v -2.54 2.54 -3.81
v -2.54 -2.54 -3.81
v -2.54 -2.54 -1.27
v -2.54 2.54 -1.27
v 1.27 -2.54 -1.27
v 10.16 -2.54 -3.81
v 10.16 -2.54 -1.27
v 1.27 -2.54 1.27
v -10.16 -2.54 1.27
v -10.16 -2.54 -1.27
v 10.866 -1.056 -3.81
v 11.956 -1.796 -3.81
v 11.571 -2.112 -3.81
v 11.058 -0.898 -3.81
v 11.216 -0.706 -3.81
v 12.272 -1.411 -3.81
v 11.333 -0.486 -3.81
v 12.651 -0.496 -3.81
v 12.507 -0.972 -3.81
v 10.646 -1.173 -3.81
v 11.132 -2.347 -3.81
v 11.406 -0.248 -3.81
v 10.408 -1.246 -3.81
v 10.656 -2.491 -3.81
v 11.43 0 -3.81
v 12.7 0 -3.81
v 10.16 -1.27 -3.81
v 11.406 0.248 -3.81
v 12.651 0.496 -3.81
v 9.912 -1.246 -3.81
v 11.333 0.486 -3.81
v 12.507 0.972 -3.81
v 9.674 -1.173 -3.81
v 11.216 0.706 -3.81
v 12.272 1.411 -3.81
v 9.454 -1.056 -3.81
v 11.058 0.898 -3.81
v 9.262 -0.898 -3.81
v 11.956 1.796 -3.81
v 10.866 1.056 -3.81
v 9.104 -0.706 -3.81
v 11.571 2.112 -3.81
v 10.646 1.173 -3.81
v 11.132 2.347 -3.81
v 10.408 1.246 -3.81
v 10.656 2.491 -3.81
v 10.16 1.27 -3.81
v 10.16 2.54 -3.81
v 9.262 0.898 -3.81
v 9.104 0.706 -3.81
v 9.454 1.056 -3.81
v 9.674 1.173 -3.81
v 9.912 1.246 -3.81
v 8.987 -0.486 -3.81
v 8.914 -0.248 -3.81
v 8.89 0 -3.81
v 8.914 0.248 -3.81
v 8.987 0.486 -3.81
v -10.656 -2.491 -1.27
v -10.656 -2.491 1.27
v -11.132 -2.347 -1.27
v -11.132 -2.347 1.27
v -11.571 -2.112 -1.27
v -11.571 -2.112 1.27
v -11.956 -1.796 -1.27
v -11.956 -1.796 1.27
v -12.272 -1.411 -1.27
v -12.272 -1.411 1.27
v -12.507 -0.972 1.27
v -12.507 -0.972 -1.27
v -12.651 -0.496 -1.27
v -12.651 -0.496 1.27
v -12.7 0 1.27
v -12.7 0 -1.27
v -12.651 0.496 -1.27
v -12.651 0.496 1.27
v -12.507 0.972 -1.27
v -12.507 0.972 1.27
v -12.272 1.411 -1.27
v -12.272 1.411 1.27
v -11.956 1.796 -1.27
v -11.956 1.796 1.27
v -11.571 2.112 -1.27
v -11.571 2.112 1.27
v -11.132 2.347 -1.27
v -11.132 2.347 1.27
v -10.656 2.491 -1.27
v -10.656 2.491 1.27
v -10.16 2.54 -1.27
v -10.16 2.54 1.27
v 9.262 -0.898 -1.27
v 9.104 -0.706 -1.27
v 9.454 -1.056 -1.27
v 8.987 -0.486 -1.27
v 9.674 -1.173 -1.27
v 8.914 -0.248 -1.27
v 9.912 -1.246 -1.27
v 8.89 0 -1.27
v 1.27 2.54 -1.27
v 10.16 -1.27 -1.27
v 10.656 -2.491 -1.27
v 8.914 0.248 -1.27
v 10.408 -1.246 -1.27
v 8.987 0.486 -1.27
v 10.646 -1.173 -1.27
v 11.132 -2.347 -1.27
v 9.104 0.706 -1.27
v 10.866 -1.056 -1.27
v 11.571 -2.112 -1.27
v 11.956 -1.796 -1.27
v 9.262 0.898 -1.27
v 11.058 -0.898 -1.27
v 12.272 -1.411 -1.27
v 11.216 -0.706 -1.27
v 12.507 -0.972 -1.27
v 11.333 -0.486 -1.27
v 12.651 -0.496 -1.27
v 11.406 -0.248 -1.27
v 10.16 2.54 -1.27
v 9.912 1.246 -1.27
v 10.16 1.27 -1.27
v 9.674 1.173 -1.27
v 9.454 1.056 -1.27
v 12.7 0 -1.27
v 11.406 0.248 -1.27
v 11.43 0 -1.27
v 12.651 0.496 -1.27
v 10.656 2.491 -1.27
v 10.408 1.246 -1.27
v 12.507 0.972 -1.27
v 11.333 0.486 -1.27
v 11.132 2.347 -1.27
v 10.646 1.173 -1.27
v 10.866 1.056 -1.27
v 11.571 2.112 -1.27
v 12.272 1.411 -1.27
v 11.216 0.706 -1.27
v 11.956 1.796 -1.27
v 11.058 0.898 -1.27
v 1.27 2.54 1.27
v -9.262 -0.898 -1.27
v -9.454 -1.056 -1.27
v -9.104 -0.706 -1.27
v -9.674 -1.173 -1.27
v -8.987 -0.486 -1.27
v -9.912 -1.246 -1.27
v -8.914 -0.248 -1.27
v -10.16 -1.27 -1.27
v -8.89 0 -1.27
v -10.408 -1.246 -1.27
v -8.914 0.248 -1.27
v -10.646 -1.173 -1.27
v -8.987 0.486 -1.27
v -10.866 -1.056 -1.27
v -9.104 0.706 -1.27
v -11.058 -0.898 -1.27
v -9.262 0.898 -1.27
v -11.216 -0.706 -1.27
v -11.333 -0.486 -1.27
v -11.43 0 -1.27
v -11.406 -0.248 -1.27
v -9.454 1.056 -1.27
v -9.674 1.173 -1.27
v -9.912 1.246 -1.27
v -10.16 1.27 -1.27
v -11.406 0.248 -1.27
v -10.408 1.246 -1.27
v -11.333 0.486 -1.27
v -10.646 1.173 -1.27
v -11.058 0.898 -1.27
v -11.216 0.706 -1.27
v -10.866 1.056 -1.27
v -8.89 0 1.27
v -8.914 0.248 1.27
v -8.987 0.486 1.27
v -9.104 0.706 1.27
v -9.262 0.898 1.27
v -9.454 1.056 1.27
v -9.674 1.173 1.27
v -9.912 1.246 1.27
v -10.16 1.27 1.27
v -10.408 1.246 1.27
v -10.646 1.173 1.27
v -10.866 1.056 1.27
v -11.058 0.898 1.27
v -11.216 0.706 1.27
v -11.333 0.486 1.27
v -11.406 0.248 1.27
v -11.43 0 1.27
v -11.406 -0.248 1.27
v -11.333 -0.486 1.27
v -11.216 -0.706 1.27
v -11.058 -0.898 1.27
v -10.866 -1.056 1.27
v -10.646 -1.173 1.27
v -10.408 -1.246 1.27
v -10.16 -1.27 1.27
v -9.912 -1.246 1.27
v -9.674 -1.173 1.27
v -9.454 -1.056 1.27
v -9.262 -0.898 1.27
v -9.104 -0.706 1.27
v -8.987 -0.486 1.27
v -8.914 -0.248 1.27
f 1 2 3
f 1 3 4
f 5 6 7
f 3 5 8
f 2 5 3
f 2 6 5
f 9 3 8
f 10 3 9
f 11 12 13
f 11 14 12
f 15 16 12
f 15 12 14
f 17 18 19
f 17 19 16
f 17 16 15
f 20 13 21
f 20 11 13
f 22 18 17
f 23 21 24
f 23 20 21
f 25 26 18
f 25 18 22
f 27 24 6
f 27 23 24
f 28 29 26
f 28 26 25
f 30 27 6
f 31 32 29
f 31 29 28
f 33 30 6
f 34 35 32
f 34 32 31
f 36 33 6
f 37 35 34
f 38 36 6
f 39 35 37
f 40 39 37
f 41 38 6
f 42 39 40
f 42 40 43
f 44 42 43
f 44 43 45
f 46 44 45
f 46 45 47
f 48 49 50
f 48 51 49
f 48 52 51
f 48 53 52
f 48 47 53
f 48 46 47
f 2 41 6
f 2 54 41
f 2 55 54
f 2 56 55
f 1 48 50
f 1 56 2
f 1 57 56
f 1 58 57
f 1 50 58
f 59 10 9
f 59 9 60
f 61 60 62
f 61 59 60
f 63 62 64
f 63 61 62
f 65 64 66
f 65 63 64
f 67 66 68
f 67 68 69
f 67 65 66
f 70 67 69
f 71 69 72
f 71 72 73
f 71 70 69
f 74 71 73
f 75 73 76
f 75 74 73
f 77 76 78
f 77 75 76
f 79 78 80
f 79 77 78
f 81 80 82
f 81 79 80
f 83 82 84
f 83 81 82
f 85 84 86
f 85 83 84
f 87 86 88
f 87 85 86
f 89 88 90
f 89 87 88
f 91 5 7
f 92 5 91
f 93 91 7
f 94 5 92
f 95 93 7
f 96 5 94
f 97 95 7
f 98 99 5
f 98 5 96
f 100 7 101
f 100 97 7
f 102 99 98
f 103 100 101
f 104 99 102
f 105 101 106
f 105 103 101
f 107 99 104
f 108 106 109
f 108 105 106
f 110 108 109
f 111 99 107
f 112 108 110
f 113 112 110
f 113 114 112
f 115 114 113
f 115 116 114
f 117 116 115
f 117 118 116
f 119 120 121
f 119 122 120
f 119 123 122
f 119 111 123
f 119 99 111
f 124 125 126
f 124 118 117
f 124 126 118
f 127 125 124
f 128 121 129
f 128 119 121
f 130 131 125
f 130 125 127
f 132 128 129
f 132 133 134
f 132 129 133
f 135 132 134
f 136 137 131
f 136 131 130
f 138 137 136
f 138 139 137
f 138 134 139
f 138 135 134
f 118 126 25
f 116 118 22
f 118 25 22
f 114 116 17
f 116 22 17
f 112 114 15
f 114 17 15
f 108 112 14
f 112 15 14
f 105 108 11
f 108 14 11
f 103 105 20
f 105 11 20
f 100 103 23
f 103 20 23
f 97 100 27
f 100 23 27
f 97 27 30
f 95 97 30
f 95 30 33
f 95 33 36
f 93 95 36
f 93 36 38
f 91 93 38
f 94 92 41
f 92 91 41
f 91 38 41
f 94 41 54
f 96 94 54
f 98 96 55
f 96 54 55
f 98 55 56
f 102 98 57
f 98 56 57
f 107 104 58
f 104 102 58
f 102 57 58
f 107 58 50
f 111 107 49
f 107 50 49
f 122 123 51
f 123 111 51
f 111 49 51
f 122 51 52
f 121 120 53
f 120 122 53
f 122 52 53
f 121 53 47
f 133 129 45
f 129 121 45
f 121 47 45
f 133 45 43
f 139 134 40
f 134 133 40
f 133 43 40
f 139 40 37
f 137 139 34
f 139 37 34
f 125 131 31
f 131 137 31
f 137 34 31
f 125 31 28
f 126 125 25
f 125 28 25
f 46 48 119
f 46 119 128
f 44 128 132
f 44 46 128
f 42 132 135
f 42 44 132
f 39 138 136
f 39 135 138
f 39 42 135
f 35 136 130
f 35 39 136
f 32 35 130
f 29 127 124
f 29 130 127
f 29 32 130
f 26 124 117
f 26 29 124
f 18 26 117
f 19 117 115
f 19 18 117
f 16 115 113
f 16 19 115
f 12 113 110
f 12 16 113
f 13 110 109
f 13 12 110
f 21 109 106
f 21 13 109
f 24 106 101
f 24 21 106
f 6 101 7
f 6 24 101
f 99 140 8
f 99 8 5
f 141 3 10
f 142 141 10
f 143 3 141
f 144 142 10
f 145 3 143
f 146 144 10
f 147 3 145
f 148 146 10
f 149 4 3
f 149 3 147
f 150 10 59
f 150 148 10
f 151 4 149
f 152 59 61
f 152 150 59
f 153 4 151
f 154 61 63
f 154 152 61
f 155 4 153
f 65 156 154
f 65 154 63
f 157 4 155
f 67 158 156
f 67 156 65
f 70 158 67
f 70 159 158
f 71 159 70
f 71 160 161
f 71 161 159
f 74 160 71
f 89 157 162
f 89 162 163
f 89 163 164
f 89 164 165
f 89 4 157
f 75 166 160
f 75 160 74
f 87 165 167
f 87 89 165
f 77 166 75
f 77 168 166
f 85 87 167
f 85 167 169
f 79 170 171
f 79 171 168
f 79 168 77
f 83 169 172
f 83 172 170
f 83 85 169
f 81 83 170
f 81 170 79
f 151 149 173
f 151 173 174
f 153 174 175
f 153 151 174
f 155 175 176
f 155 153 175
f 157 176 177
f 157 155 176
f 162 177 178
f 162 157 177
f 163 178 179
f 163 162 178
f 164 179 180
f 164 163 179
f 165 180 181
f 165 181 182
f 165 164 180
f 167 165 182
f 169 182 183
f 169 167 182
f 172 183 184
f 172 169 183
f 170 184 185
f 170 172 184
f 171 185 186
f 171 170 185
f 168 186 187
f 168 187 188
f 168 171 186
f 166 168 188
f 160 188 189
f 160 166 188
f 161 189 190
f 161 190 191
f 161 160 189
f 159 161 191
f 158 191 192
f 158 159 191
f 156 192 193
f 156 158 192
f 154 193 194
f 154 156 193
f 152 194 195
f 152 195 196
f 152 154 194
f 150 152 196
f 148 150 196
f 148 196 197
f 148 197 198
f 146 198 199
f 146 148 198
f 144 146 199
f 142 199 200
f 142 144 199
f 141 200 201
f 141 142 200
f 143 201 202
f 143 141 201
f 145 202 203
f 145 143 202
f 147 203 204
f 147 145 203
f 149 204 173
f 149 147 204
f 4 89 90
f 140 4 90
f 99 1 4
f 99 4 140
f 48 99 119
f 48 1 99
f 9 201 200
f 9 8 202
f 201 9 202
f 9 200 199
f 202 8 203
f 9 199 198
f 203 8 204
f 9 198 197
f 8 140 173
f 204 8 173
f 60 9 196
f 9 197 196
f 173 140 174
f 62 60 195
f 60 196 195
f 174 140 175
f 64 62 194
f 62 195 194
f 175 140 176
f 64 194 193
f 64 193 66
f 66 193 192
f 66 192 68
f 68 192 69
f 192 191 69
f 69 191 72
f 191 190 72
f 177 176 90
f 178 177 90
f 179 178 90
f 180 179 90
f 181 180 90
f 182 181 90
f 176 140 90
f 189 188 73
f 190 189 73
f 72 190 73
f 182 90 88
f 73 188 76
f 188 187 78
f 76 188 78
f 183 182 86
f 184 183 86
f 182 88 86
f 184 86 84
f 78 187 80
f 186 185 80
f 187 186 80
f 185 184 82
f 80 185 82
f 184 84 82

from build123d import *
from build123d.topology import SkipClean

# Parameters (mm, degrees)
BOSS_EXTRUDE1_DEPTH      = 1.27
BOSS_EXTRUDE1_DEPTH_BACK = 1.27
SKETCH1_R                = 1.27
BOSS_EXTRUDE2_START      = 2.54
SKETCH3_R                = 1.27
BOSS_EXTRUDE2_DEPTH      = 2.54
SKETCH4_W                = 11.43
SKETCH4_H                = 2.54
CUT_EXTRUDE2_DEPTH       = 15.199031657


with BuildPart() as part:
    # Sketch1 → Boss-Extrude1 (new, two sides: drawn at the far end of the back side and taken through both)
    with BuildSketch(Plane.XY.offset(-BOSS_EXTRUDE1_DEPTH_BACK)):
        with BuildLine():
            Line((-10.16, 2.54), (10.16, 2.54))
            ThreePointArc((10.16, 2.54), (12.7, 0), (10.16, -2.54))
            Line((10.16, -2.54), (-10.16, -2.54))
            ThreePointArc((-10.16, -2.54), (-12.7, 0), (-10.16, 2.54))
        make_face()
        with Locations((-10.16, 0)):
            Circle(SKETCH1_R, mode=Mode.SUBTRACT)
        with Locations((10.16, 0)):
            Circle(SKETCH1_R, mode=Mode.SUBTRACT)
    extrude(amount=BOSS_EXTRUDE1_DEPTH + BOSS_EXTRUDE1_DEPTH_BACK)

    # Sketch3 → Boss-Extrude2 (add)
    with SkipClean():  # the faces are left unmerged after this step: merging them gives an invalid solid
        with BuildSketch(Plane(origin=(0, 0, -1.27), x_dir=(-1, 0, 0), z_dir=(0, 0, -1)).offset(BOSS_EXTRUDE2_START)):
            with BuildLine():
                Line((2.54, -2.54), (2.54, 2.54))
                Line((2.54, 2.54), (-10.16, 2.54))
                ThreePointArc((-10.16, 2.54), (-12.7, 0), (-10.16, -2.54))
                Line((-10.16, -2.54), (2.54, -2.54))
            make_face()
            with Locations((-10.16, 0)):
                Circle(SKETCH3_R, mode=Mode.SUBTRACT)
        extrude(amount=-BOSS_EXTRUDE2_DEPTH)

    # Sketch4 → Cut-Extrude2 (cut, through all)
    with BuildSketch(Plane(origin=(0, 2.54, 0), x_dir=(1, 0, 0), z_dir=(0, 1, 0))):
        with Locations((6.985, 0)):
            Rectangle(SKETCH4_W, SKETCH4_H)
    extrude(amount=-CUT_EXTRUDE2_DEPTH, mode=Mode.SUBTRACT)


solid = part.part
